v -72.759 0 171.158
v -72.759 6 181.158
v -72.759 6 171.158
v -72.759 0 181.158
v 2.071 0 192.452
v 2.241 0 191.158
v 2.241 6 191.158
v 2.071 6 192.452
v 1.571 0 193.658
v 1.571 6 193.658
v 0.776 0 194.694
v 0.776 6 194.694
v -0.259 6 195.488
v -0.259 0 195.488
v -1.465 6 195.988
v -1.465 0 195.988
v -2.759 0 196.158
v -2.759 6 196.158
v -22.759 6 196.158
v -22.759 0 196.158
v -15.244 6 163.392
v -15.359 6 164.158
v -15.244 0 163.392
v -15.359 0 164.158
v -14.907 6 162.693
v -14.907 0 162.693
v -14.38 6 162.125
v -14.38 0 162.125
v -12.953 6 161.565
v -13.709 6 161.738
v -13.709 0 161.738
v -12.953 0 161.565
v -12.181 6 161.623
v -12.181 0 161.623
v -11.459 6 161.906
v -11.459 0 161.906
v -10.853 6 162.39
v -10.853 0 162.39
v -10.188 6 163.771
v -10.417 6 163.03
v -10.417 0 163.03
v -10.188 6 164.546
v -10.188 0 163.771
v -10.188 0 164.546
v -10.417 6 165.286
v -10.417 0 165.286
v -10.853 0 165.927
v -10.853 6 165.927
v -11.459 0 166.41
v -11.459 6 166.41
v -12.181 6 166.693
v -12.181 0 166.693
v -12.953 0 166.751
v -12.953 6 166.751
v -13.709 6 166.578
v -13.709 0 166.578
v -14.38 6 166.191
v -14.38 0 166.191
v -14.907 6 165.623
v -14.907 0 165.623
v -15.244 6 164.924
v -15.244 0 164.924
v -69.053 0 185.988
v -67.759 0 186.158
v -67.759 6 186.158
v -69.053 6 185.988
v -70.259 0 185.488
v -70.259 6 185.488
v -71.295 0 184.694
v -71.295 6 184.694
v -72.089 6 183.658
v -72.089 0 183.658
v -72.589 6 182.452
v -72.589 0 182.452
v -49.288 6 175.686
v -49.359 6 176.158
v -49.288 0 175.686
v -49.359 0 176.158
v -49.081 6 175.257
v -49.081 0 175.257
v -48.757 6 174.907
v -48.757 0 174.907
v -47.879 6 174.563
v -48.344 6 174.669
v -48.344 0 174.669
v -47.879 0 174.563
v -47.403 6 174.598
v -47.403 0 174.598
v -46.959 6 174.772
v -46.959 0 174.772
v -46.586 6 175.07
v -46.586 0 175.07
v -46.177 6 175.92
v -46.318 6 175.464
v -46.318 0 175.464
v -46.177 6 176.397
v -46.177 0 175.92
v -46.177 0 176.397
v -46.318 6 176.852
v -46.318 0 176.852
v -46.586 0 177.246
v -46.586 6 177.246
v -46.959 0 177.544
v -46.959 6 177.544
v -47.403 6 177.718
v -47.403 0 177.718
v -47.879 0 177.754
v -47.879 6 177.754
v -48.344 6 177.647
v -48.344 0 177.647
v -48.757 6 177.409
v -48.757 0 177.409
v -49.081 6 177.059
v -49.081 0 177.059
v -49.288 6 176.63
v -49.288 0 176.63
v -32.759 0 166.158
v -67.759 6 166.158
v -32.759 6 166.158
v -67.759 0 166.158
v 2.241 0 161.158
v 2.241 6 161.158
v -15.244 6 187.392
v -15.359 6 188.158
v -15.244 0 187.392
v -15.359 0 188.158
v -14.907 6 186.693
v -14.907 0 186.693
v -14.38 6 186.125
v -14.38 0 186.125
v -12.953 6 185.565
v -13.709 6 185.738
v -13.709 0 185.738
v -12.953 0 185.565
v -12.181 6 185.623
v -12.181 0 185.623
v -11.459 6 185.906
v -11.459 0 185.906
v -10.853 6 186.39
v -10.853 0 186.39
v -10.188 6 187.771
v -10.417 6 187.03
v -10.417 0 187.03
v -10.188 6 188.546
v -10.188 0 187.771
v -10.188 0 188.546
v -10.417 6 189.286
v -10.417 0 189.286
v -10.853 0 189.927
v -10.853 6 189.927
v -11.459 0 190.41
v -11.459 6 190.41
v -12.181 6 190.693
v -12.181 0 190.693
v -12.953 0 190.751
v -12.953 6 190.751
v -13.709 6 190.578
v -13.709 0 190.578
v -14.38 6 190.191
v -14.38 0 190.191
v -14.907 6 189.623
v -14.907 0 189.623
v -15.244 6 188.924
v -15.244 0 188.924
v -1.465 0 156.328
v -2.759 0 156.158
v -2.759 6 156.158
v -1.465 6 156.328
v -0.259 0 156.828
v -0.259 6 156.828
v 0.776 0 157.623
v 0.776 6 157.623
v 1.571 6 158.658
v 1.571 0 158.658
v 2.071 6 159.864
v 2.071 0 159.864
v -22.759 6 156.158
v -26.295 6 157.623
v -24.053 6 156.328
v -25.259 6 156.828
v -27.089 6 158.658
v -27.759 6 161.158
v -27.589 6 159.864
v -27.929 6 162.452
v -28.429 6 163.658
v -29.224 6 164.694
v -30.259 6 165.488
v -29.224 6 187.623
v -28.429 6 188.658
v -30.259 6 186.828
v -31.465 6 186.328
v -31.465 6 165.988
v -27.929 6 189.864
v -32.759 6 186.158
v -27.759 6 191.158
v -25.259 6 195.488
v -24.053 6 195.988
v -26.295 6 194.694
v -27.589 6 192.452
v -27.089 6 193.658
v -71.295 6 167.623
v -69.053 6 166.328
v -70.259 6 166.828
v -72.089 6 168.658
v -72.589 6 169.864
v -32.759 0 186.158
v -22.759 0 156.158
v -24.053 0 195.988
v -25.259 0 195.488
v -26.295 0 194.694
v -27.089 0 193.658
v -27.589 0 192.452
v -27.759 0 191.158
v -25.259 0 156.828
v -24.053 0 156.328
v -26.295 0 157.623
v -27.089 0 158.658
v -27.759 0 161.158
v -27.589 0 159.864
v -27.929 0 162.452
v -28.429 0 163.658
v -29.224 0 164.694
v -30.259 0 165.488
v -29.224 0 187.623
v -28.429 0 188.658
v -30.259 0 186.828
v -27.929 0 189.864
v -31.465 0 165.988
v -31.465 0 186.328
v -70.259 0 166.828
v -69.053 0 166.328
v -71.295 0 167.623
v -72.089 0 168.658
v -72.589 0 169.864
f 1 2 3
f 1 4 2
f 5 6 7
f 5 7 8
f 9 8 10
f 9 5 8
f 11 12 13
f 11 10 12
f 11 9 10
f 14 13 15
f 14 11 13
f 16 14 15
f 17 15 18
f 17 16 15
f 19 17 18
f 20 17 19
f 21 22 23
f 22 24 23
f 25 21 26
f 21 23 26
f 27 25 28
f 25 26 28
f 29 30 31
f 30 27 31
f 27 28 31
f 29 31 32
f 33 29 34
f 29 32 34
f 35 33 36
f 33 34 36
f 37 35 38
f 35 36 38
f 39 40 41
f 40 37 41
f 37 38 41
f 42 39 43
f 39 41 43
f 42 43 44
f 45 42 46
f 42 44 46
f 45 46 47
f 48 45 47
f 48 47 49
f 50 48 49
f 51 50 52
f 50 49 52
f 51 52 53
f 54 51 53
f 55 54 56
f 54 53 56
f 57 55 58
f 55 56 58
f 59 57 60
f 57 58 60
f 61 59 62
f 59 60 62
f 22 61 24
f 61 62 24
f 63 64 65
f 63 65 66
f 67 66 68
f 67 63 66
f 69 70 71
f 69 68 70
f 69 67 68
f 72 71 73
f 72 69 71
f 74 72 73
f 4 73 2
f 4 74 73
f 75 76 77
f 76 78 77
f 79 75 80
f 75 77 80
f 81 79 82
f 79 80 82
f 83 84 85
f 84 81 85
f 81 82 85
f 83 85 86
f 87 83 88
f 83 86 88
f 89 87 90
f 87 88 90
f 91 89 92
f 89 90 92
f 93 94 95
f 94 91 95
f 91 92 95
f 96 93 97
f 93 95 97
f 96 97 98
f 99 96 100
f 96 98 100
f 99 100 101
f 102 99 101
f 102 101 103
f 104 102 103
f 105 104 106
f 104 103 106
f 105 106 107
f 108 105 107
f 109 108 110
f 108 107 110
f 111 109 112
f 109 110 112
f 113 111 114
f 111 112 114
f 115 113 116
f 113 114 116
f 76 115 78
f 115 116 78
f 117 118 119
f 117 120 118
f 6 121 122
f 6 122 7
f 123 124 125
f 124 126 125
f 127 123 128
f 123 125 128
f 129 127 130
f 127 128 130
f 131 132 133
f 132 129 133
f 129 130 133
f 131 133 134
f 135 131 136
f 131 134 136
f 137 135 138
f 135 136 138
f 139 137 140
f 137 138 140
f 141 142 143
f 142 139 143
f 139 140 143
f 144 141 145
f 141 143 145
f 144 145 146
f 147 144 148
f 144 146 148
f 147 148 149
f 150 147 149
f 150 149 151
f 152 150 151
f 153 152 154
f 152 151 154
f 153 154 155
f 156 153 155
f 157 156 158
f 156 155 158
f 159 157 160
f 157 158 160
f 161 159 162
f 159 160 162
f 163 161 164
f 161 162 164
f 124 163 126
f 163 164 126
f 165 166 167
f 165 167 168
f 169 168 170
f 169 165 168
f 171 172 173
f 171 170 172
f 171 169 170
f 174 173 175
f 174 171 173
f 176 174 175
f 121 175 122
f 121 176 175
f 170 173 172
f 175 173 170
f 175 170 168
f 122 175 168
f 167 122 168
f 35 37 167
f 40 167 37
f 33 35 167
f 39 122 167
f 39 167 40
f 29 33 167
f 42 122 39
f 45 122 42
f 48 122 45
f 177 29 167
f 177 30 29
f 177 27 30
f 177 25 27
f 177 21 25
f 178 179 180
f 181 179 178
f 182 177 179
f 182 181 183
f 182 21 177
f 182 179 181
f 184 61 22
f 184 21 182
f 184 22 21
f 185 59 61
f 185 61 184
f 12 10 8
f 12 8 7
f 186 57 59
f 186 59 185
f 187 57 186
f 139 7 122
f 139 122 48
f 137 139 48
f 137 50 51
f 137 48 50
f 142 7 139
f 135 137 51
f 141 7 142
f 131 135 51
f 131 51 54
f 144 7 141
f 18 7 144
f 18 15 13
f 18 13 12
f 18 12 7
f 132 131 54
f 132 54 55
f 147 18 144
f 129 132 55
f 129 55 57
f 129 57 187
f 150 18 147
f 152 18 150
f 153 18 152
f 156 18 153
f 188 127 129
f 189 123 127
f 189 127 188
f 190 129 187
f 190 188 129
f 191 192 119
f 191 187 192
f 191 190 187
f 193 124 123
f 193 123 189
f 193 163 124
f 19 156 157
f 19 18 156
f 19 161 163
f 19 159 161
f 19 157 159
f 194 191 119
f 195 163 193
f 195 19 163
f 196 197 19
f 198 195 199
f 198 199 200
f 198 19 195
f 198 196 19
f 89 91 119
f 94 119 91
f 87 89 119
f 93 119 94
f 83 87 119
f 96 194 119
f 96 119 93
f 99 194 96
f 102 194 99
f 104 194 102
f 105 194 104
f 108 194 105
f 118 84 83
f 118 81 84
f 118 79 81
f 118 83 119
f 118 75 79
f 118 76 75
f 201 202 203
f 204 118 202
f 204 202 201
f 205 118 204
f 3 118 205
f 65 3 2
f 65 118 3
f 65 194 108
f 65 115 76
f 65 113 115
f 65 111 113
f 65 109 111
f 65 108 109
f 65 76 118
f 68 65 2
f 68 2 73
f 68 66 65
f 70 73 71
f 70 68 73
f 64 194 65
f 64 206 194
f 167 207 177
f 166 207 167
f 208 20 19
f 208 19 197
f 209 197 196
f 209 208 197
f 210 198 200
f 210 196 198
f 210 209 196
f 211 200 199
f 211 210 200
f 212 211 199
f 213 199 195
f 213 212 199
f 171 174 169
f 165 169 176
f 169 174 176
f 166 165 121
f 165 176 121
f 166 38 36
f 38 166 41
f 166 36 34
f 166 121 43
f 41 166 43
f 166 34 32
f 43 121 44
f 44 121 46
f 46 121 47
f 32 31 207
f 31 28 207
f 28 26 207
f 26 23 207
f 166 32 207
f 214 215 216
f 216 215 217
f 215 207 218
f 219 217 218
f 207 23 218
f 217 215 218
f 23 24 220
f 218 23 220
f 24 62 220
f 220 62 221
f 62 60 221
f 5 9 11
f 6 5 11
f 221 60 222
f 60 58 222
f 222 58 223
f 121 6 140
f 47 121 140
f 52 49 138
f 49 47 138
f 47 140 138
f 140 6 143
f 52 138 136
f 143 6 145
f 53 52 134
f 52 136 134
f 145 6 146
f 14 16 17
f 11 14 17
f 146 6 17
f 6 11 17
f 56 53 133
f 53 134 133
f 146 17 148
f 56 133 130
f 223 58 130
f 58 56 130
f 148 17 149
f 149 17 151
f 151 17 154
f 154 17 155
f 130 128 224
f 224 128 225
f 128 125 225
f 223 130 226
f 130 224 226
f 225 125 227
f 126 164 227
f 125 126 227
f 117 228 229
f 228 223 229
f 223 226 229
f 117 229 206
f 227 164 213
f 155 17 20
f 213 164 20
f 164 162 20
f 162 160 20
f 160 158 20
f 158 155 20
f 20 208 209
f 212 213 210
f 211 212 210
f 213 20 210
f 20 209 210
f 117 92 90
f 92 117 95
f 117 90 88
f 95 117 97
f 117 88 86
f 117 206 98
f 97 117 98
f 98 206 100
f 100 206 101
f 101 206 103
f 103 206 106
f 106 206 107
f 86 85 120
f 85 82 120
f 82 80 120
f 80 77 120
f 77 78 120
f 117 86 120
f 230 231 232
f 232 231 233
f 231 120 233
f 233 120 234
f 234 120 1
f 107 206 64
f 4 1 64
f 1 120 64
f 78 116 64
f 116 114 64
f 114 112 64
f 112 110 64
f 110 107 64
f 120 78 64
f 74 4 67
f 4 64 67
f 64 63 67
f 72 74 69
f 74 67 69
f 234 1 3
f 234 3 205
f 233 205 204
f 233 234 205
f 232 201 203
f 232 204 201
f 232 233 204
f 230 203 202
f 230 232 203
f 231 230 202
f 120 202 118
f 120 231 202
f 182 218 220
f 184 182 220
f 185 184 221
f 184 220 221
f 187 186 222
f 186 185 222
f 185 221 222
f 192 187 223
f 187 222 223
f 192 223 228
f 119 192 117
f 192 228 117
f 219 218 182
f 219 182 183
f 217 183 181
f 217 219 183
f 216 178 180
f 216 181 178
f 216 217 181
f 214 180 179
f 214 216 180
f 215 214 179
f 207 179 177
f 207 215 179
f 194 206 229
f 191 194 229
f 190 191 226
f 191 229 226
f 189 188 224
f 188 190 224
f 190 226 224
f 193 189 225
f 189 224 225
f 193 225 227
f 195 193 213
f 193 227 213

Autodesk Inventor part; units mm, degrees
ref_plane "YZ Plane" through (0, 0, 0) normal (1, 0, 0) x (0, 1, 0)
ref_plane "XZ Plane" through (0, 0, 0) normal (0, 1, 0) x (-1, 0, 0)
ref_plane "XY Plane" through (0, 0, 0) normal (0, 0, 1) x (1, 0, 0)
sketch "Sketch1" plane through (0, 0, 0) normal (0, 1, 0) x (-1, 0, 0)
  line L0 (32.7591, 186.1581) -> (67.7591, 186.1581)
  arc A0 (72.7591, 181.1581) -> (67.7591, 186.1581) centre (67.7591, 181.1581) ccw
  line L1 (72.7591, 181.1581) -> (72.7591, 171.1581)
  arc A1 (67.7591, 166.1581) -> (72.7591, 171.1581) centre (67.7591, 171.1581) ccw
  line L2 (67.7591, 166.1581) -> (32.7591, 166.1581)
  arc A2 (32.7591, 166.1581) -> (27.7591, 161.1581) centre (32.7591, 161.1581) ccw
  arc A3 (22.7591, 156.1581) -> (27.7591, 161.1581) centre (22.7591, 161.1581) ccw
  line L3 (22.7591, 156.1581) -> (2.7591, 156.1581)
  arc A4 (-2.2409, 161.1581) -> (2.7591, 156.1581) centre (2.7591, 161.1581) ccw
  line L4 (-2.2409, 161.1581) -> (-2.2409, 191.1581)
  arc A5 (2.7591, 196.1581) -> (-2.2409, 191.1581) centre (2.7591, 191.1581) ccw
  line L5 (2.7591, 196.1581) -> (22.7591, 196.1581)
  arc A6 (27.7591, 191.1581) -> (22.7591, 196.1581) centre (22.7591, 191.1581) ccw
  arc A7 (27.7591, 191.1581) -> (32.7591, 186.1581) centre (32.7591, 191.1581) ccw
  circle A8 centre (12.7591, 188.1581) radius 2.6
  circle A9 centre (12.7591, 164.1581) radius 2.6
  circle A10 centre (47.7591, 176.1581) radius 1.6
  point P0 (0, 0)
extrude "Extrusion1" add sketch "Sketch1" along normal blind 6
properties part number "LCD-Plate"
